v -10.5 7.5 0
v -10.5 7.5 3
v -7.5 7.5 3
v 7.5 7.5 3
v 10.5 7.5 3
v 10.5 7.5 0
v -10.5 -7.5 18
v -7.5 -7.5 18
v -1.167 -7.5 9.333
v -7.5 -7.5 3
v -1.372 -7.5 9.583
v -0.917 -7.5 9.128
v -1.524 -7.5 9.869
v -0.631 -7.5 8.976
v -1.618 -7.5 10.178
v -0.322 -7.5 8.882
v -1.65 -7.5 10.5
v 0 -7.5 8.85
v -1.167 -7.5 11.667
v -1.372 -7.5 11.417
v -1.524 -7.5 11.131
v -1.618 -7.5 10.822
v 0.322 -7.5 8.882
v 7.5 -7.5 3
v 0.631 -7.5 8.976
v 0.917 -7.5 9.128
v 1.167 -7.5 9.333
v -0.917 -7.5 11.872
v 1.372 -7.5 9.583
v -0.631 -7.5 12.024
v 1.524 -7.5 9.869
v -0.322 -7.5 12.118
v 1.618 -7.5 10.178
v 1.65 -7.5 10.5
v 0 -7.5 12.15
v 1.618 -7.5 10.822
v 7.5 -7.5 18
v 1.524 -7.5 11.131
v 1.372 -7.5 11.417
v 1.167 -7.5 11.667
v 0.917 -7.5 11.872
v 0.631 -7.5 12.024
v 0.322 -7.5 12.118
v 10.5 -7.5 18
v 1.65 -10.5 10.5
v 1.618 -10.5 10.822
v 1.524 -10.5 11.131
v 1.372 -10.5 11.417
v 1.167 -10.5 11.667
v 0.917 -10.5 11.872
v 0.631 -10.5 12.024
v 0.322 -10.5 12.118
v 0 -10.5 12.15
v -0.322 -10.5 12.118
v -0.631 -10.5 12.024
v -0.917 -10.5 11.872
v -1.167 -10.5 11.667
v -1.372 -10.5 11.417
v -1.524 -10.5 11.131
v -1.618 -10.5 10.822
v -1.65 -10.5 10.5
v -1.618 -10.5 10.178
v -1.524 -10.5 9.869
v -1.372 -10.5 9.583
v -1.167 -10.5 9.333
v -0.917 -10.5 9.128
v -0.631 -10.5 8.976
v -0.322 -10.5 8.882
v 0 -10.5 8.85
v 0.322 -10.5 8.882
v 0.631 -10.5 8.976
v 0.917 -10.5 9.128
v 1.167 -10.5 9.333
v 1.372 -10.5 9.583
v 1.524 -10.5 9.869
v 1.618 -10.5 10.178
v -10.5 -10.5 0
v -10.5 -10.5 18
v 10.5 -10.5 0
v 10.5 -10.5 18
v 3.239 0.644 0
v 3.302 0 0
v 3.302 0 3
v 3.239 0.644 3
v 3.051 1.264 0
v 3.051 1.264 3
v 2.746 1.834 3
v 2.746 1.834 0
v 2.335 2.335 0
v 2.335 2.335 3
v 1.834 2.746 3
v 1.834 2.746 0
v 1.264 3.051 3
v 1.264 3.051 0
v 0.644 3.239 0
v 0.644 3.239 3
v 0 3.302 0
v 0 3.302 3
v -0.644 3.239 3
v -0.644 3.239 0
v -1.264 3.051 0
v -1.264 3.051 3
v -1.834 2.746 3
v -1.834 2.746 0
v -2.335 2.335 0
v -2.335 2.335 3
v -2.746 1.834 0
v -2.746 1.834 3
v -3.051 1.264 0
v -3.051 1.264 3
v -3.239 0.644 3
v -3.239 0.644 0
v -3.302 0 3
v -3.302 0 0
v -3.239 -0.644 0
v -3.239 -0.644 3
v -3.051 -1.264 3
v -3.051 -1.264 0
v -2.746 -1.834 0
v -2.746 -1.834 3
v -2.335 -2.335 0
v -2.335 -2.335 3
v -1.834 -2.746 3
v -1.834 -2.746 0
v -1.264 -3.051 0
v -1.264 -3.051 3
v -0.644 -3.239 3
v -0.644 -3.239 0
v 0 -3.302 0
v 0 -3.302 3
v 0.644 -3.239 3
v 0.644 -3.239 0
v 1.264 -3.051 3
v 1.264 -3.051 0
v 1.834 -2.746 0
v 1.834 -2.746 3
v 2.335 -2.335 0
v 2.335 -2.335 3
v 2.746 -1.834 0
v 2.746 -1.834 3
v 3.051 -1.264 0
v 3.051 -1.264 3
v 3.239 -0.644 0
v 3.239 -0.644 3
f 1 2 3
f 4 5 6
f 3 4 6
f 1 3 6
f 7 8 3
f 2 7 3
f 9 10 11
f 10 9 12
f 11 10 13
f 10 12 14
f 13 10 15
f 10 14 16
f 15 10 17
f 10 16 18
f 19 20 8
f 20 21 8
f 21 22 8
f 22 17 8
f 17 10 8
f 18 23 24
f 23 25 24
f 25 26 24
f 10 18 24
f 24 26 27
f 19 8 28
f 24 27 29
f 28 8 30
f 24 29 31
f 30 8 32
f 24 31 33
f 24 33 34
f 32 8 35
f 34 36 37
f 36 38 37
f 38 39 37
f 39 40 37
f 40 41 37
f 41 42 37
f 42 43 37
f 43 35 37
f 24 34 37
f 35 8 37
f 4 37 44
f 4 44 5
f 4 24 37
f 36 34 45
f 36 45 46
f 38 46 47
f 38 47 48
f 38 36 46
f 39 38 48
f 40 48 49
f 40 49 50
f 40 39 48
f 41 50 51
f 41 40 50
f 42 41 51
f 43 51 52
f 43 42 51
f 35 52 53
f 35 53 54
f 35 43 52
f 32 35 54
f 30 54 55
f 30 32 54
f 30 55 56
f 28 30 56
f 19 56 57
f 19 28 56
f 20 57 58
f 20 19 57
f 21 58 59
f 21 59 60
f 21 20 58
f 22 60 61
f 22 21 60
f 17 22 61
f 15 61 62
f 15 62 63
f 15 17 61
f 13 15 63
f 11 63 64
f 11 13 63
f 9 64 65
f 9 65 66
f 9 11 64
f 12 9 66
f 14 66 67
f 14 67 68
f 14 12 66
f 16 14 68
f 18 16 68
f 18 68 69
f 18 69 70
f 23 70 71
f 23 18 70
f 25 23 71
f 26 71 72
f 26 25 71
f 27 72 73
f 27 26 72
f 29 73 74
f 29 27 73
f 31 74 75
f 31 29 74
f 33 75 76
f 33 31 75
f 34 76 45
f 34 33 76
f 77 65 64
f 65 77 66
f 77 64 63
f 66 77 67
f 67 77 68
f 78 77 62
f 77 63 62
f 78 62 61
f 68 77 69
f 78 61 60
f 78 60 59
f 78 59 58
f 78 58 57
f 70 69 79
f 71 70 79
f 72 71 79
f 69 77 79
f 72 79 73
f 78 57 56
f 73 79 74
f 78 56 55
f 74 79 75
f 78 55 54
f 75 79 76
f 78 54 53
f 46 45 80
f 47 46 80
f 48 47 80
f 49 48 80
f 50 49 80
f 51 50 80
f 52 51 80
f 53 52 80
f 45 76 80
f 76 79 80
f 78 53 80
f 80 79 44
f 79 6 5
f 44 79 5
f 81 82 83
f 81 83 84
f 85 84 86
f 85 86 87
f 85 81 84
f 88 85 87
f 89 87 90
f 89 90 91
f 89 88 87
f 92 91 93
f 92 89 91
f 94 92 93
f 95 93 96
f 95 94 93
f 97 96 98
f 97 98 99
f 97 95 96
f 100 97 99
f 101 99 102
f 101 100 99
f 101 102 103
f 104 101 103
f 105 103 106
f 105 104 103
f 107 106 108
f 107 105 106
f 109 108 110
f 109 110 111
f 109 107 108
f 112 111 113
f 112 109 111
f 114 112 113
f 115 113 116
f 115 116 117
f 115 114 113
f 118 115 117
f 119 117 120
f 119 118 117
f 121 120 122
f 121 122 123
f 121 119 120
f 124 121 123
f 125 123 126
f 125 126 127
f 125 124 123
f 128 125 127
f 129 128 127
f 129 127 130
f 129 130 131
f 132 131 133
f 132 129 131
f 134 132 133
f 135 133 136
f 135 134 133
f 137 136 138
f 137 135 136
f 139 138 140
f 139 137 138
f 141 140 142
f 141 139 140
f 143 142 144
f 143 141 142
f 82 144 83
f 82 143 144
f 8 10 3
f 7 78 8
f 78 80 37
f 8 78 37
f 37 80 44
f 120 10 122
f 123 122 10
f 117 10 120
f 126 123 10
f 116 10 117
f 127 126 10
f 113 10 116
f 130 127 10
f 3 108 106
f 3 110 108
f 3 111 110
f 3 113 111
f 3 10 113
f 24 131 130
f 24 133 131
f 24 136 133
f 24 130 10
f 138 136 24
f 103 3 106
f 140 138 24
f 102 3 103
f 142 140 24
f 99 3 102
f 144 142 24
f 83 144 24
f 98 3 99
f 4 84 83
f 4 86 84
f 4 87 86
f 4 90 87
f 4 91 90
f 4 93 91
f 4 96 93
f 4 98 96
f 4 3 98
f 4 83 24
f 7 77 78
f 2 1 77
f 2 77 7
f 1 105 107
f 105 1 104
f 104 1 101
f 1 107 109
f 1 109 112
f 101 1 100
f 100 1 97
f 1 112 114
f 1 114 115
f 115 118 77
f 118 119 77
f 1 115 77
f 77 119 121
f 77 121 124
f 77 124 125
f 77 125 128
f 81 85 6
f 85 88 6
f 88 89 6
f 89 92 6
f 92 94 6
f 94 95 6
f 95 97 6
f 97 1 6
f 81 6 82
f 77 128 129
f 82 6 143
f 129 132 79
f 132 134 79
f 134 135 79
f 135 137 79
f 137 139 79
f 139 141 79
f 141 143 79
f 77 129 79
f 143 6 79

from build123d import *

# Parameters (mm, degrees)
SKETCH1_W           = 15
SKETCH1_H           = 15
SKETCH1_R           = 3.302
BOSS_EXTRUDE1_DEPTH = 3
SKETCH2_W           = 15
SKETCH2_H           = 18
SKETCH2_R           = 1.65
BOSS_EXTRUDE2_DEPTH = 3
BOSS_EXTRUDE3_DEPTH = 3


with BuildPart() as part:
    # Sketch1 → Boss-Extrude1 (new body)
    with BuildSketch(Plane.XY):
        Rectangle(SKETCH1_W, SKETCH1_H)
        Circle(SKETCH1_R, mode=Mode.SUBTRACT)
    extrude(amount=BOSS_EXTRUDE1_DEPTH)

    # Sketch2 → Boss-Extrude2 (add)
    with BuildSketch(Plane.XZ.offset(7.5)):
        with Locations((0, 9)):
            Rectangle(SKETCH2_W, SKETCH2_H)
        with Locations((0, 10.5)):
            Circle(SKETCH2_R, mode=Mode.SUBTRACT)
    extrude(amount=BOSS_EXTRUDE2_DEPTH)

    # Sketch3 → Boss-Extrude3 (add)
    with BuildSketch(Plane(origin=(7.5, 0, 0), x_dir=(0, 0, -1), z_dir=(1, 0, 0))):
        Polygon((-18, -10.5), (-18, -7.5), (-3, 7.5), (0, 7.5), (0, -10.5), align=None)
    boss_extrude3 = extrude(amount=BOSS_EXTRUDE3_DEPTH)

    # Mirror1: Boss-Extrude3 across plane
    add(boss_extrude3.mirror(Plane(origin=(0, 0, 0), x_dir=(0, 0, 1), z_dir=(1, 0, 0))))


solid = part.part
